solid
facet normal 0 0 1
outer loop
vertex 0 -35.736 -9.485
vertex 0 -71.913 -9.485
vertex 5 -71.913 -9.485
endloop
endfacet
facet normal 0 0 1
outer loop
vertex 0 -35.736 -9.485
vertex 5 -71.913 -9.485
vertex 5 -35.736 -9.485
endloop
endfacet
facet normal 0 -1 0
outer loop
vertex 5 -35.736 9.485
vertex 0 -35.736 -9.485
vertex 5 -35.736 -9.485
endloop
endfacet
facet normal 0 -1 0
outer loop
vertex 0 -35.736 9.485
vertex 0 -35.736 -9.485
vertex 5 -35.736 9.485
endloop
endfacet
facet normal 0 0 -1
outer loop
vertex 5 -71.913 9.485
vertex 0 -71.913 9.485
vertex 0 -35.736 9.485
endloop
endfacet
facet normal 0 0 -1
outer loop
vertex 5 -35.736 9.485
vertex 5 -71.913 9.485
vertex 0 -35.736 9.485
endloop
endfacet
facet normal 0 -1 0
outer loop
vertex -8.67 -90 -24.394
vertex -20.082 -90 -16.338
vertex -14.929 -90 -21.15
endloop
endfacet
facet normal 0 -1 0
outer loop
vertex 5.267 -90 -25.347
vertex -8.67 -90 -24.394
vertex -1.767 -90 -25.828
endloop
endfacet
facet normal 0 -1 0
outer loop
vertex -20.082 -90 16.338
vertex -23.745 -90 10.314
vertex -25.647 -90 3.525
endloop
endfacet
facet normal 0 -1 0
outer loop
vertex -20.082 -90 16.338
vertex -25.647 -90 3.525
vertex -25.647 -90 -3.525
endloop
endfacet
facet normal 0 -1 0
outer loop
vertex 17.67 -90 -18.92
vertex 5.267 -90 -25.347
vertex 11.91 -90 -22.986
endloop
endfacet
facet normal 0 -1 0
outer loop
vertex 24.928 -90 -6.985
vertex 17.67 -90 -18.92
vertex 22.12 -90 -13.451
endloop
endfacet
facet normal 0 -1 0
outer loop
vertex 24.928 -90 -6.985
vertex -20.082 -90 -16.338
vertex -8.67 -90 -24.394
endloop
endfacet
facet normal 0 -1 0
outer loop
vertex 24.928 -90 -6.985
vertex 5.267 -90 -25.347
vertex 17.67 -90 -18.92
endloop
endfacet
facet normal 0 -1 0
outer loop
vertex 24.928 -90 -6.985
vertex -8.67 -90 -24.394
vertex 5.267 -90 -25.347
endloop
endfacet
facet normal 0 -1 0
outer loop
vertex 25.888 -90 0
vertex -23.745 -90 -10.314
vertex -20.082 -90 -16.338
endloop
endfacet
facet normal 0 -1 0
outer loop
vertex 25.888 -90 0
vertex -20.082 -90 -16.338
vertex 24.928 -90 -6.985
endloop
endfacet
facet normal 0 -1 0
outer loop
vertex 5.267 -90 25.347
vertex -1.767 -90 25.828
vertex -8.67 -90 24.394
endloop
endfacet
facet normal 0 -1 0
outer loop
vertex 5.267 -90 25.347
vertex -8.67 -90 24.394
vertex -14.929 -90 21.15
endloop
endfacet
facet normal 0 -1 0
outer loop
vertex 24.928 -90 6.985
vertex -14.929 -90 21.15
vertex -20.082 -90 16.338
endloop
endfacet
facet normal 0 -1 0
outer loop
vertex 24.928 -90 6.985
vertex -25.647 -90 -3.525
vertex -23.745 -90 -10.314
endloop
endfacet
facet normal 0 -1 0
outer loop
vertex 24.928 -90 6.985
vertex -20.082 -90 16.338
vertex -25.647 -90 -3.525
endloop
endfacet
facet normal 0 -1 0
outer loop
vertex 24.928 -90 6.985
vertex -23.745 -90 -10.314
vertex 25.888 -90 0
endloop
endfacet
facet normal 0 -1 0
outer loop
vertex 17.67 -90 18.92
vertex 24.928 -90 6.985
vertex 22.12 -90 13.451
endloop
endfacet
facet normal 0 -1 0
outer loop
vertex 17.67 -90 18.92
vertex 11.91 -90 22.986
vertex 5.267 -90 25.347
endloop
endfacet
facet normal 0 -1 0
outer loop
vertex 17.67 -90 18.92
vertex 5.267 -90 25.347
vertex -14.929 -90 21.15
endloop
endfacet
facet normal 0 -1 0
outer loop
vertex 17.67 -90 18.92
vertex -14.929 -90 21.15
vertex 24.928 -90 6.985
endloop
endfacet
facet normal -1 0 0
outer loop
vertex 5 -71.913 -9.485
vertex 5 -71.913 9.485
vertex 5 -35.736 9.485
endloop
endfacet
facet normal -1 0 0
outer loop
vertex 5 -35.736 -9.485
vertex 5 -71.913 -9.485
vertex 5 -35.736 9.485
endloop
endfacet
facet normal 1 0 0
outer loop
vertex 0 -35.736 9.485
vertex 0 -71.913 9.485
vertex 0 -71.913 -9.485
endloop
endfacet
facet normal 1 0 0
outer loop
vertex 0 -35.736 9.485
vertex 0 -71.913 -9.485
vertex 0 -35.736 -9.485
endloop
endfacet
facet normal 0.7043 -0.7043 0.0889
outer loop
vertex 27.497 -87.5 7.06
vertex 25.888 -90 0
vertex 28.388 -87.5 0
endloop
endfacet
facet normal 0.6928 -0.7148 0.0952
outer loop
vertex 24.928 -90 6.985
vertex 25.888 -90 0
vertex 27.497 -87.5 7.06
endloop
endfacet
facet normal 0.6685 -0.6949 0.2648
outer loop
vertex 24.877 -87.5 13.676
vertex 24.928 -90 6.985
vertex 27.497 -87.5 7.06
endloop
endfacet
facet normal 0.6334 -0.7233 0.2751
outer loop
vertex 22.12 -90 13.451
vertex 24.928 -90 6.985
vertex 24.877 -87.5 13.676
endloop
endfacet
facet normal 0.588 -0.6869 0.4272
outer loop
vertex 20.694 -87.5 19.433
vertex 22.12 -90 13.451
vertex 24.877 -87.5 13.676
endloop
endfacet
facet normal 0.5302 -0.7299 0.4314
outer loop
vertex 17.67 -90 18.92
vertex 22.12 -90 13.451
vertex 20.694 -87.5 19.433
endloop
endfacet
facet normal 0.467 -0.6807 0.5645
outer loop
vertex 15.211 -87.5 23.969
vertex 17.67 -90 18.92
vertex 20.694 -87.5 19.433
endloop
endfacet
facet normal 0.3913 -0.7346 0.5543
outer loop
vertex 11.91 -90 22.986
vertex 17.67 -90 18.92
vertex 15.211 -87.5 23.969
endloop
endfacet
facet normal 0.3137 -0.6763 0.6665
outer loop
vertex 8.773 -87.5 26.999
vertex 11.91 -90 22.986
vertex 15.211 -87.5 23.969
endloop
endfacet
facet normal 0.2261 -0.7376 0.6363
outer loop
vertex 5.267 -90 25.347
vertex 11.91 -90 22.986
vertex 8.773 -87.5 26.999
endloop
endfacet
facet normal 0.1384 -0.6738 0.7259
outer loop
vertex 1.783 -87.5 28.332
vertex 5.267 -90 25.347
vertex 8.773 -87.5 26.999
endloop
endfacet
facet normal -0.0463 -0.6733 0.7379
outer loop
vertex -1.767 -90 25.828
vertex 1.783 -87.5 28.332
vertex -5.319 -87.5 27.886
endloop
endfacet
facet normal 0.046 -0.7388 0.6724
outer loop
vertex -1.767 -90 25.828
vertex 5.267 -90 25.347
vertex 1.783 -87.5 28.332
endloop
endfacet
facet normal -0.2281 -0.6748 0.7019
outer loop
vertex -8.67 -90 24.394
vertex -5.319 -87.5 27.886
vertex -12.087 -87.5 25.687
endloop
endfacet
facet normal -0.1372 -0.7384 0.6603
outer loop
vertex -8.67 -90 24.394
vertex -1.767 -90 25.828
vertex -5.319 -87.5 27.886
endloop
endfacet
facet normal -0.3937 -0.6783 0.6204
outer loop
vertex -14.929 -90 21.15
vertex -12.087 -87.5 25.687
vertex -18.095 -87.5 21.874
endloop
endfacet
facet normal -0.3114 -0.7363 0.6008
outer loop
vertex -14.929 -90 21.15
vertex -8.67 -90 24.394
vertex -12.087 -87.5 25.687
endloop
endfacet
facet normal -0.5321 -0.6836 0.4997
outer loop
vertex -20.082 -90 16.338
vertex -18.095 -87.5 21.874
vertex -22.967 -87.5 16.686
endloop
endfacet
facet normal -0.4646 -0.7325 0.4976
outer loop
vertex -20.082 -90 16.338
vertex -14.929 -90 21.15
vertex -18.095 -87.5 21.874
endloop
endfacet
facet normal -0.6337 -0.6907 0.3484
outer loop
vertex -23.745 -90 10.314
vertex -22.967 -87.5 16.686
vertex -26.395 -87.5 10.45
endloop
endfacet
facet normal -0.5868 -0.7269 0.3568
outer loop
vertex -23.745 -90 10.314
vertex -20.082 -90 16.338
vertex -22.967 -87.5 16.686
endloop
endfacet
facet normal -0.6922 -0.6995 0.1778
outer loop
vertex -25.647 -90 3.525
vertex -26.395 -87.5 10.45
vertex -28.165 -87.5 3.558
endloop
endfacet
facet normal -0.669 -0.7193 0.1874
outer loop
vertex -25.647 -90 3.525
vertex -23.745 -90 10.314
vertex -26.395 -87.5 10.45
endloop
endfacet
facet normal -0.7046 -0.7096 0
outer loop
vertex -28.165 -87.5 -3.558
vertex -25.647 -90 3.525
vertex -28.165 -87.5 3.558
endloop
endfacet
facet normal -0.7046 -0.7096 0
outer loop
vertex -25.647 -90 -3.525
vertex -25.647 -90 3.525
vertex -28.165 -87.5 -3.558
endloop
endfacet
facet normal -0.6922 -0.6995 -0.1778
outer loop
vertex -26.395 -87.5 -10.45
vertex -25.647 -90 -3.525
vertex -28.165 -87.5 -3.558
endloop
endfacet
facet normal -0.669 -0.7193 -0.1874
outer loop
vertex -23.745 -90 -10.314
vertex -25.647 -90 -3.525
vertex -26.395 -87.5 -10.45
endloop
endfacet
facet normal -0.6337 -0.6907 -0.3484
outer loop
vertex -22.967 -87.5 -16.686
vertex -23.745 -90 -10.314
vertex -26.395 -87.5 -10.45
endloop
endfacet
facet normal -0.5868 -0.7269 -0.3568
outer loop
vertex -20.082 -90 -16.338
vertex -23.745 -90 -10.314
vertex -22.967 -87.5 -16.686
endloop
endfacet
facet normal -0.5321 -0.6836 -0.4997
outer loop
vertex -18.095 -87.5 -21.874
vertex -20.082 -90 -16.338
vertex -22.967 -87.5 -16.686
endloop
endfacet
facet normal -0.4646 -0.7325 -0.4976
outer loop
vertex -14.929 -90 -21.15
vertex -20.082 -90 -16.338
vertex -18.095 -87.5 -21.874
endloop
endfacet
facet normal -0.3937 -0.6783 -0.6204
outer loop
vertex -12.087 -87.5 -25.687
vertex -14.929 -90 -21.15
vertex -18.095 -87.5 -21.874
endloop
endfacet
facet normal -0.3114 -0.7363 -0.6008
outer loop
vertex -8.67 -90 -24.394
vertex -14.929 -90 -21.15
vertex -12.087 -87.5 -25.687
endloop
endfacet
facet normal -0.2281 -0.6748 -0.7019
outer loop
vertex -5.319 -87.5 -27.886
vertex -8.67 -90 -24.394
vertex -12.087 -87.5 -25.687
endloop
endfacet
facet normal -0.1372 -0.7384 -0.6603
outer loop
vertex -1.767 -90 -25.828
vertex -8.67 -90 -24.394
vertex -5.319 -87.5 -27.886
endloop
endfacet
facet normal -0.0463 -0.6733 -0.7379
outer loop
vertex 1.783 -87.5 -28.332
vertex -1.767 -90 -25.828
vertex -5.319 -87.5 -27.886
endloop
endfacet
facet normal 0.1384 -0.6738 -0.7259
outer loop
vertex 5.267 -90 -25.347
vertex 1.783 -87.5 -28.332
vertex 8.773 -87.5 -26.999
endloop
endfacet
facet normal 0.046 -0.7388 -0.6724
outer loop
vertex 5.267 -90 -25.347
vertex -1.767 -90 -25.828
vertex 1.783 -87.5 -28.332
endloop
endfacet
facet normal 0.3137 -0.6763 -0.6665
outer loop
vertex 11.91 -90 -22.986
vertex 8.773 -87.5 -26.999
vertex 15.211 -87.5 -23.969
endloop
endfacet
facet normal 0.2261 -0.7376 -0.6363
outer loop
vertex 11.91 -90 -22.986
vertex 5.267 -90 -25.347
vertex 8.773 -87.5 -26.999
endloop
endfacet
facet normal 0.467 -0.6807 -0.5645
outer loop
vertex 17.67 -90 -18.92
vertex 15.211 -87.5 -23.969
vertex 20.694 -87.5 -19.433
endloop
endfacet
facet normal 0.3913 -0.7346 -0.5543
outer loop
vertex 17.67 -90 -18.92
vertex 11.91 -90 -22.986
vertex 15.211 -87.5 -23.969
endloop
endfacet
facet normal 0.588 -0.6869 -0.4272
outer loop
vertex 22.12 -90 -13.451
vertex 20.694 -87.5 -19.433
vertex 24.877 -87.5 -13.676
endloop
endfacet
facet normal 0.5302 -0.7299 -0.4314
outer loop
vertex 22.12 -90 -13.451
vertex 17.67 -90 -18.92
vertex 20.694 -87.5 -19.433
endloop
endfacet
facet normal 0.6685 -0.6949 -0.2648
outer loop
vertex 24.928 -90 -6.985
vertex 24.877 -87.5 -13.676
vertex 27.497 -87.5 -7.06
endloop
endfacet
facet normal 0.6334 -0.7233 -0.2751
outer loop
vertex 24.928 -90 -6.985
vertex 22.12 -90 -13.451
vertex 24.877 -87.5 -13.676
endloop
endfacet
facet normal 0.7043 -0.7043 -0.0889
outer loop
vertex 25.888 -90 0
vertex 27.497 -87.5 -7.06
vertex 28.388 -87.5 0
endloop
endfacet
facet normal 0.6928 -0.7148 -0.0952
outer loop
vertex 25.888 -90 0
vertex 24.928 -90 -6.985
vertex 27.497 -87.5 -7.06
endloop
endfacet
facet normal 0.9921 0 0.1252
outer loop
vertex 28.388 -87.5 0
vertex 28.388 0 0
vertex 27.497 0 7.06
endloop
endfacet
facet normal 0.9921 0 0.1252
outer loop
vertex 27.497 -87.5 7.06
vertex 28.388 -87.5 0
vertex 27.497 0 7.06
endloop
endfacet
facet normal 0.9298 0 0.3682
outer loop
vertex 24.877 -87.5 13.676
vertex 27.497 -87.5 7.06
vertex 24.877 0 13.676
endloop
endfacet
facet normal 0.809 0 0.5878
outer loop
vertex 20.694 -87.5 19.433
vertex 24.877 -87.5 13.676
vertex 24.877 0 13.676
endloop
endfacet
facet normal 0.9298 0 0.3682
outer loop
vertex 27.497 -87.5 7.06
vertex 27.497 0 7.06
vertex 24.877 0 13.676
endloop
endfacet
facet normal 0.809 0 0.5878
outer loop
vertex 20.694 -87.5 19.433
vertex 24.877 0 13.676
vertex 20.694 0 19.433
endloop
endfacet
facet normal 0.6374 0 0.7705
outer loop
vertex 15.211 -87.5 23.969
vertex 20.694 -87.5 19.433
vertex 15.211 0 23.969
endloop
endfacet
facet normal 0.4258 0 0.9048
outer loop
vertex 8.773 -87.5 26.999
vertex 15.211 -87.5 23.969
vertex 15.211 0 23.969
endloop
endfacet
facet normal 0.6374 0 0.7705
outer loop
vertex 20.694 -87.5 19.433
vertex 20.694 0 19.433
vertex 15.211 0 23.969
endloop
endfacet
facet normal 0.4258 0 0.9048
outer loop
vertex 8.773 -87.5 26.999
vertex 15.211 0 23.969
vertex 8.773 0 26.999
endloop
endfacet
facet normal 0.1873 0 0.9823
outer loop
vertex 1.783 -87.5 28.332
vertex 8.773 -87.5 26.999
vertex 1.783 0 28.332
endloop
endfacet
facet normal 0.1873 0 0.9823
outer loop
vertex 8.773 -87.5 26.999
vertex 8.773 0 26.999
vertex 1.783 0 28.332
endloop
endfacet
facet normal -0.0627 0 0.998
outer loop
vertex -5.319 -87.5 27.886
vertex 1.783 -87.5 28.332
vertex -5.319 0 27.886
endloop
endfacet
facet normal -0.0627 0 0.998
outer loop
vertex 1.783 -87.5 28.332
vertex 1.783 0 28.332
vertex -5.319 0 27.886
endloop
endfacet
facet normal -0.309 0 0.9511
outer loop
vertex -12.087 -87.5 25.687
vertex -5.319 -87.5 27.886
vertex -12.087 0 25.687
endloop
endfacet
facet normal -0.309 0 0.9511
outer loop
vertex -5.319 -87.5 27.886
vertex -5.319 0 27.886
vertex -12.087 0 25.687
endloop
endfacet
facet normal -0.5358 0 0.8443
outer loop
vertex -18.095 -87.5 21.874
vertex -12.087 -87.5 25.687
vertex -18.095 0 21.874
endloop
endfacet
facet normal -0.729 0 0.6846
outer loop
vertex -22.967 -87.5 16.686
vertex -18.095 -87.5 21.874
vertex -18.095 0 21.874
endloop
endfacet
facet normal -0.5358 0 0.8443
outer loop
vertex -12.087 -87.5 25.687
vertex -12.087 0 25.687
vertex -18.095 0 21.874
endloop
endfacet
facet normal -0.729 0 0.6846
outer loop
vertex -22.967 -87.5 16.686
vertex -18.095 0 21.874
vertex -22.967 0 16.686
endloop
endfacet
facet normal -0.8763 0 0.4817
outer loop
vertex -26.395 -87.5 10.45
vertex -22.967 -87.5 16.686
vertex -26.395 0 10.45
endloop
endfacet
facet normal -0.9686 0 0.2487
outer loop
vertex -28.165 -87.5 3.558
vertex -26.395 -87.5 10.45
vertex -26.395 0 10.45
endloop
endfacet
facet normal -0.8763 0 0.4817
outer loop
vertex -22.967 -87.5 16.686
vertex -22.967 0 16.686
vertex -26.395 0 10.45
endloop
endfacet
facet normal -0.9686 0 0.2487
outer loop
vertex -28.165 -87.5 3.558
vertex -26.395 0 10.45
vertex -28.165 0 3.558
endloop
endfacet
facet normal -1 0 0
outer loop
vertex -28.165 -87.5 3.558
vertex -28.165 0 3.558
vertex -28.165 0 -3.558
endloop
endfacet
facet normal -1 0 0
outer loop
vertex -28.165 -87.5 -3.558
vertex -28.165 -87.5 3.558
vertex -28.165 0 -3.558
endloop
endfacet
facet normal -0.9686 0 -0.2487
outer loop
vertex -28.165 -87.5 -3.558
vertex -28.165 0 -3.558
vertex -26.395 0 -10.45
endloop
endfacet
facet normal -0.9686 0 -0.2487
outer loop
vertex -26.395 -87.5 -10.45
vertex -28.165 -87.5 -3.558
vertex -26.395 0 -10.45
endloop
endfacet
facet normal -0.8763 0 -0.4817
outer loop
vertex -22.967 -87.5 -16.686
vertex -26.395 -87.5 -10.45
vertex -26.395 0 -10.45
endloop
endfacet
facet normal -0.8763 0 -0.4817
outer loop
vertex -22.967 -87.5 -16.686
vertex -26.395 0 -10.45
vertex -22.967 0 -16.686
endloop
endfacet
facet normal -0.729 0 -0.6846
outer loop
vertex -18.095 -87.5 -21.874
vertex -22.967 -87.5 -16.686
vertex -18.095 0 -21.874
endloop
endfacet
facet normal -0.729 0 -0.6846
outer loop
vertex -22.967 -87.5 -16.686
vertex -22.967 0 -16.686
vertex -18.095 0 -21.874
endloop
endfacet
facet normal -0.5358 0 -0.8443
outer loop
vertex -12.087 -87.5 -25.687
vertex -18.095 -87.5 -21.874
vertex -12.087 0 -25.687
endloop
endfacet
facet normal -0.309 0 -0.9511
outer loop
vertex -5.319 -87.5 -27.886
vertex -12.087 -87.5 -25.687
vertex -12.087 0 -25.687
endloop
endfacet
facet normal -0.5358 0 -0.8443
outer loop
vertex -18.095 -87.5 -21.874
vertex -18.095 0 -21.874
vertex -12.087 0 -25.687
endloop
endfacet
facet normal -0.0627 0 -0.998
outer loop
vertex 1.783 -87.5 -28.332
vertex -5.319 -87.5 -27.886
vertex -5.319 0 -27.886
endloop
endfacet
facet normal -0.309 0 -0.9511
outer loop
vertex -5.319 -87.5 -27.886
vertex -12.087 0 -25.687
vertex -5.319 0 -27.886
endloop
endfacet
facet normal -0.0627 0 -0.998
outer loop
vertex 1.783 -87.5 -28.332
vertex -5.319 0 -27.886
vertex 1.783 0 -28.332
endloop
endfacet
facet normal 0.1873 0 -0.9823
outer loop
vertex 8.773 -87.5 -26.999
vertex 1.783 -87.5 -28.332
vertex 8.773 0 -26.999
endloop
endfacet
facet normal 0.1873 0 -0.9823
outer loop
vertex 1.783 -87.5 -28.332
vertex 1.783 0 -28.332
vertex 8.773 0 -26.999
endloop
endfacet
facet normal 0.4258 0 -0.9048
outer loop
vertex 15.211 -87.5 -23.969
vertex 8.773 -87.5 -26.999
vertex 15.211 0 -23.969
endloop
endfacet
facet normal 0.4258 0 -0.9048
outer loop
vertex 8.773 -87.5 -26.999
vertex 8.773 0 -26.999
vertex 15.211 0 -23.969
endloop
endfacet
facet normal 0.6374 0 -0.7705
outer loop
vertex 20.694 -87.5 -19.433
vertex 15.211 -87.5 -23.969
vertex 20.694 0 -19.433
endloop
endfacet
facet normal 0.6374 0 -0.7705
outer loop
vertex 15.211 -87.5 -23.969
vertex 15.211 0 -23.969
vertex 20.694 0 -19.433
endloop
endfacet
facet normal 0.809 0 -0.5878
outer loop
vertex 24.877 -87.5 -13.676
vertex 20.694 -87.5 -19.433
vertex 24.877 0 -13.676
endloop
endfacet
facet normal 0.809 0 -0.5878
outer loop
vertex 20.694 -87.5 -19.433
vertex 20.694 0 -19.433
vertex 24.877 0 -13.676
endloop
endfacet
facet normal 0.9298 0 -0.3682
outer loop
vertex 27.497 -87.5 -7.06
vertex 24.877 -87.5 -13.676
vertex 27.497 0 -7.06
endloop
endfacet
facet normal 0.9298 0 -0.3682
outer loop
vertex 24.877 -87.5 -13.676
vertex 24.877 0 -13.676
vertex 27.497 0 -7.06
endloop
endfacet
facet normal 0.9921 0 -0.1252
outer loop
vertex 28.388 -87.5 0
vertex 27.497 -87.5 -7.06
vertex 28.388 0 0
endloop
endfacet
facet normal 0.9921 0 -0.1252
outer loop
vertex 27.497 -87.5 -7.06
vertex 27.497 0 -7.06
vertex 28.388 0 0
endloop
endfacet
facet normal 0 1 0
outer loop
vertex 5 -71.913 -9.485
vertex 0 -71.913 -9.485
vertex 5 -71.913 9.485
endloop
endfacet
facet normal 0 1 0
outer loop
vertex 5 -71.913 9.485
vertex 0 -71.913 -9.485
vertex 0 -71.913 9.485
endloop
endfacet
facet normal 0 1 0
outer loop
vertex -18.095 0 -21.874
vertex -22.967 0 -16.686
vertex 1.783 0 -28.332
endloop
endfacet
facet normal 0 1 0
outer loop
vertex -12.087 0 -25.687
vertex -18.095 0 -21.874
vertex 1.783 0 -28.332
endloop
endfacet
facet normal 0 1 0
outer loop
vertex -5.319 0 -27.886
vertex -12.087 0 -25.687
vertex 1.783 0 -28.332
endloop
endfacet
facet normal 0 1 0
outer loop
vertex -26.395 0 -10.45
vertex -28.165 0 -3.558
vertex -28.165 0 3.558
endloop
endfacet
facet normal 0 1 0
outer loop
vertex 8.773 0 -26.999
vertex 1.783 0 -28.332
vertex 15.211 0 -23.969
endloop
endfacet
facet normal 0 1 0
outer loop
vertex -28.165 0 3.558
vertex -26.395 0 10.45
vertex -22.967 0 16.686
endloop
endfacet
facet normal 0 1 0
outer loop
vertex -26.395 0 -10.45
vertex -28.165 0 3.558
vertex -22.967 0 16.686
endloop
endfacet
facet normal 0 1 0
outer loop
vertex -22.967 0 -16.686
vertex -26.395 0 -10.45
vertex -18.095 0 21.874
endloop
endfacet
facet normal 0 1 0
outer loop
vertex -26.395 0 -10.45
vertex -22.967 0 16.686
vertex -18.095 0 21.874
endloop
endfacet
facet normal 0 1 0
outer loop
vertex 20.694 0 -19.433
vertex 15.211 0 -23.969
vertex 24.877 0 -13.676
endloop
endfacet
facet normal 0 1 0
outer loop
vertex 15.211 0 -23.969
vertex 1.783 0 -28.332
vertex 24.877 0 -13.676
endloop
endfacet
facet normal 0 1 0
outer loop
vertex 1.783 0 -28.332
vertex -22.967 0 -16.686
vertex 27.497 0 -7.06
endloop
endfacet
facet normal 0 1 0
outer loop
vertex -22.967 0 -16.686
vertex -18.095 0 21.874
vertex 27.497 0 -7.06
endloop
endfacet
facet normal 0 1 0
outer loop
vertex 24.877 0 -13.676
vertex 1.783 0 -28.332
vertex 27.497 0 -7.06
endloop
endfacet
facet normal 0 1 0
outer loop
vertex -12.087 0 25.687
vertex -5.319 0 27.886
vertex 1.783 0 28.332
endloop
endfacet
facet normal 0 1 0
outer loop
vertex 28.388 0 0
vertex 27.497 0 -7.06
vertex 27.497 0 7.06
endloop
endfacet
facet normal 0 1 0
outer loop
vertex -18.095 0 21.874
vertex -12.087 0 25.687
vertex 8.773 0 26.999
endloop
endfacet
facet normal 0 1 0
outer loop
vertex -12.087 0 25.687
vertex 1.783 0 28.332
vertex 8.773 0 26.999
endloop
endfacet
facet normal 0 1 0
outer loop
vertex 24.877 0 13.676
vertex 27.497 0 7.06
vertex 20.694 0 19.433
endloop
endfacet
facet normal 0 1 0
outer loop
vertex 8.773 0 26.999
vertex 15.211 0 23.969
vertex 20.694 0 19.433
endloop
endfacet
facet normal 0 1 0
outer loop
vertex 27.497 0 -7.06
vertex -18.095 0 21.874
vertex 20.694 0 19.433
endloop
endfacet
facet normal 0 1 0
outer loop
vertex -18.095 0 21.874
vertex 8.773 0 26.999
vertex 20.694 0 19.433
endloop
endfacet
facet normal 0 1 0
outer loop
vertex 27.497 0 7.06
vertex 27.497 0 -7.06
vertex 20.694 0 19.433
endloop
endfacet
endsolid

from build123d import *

# Parameters (mm, degrees)
F0_R     = 28.388449
F1_DEPTH = 90
F2_SIZE  = 2.5
F3_W     = 36.176905
F3_H     = 18.97082
F4_DEPTH = 5


with BuildPart() as f1:
    # F0 (on Front) → F1 (new body)
    with BuildSketch(Plane.XZ):
        Circle(F0_R)
    extrude(amount=F1_DEPTH)

    # F2
    f2_edges = [f1.edges().sort_by_distance(p)[0] for p in [
        (-28.388449, -90, 0),
    ]]
    chamfer(f2_edges, length=F2_SIZE)

    # F3 (on Right) → F4 (cut)
    with BuildSketch(Plane.YZ):
        with Locations((-53.824171, 0)):
            Rectangle(F3_W, F3_H)
    extrude(amount=F4_DEPTH, mode=Mode.SUBTRACT)


solid = f1.part
